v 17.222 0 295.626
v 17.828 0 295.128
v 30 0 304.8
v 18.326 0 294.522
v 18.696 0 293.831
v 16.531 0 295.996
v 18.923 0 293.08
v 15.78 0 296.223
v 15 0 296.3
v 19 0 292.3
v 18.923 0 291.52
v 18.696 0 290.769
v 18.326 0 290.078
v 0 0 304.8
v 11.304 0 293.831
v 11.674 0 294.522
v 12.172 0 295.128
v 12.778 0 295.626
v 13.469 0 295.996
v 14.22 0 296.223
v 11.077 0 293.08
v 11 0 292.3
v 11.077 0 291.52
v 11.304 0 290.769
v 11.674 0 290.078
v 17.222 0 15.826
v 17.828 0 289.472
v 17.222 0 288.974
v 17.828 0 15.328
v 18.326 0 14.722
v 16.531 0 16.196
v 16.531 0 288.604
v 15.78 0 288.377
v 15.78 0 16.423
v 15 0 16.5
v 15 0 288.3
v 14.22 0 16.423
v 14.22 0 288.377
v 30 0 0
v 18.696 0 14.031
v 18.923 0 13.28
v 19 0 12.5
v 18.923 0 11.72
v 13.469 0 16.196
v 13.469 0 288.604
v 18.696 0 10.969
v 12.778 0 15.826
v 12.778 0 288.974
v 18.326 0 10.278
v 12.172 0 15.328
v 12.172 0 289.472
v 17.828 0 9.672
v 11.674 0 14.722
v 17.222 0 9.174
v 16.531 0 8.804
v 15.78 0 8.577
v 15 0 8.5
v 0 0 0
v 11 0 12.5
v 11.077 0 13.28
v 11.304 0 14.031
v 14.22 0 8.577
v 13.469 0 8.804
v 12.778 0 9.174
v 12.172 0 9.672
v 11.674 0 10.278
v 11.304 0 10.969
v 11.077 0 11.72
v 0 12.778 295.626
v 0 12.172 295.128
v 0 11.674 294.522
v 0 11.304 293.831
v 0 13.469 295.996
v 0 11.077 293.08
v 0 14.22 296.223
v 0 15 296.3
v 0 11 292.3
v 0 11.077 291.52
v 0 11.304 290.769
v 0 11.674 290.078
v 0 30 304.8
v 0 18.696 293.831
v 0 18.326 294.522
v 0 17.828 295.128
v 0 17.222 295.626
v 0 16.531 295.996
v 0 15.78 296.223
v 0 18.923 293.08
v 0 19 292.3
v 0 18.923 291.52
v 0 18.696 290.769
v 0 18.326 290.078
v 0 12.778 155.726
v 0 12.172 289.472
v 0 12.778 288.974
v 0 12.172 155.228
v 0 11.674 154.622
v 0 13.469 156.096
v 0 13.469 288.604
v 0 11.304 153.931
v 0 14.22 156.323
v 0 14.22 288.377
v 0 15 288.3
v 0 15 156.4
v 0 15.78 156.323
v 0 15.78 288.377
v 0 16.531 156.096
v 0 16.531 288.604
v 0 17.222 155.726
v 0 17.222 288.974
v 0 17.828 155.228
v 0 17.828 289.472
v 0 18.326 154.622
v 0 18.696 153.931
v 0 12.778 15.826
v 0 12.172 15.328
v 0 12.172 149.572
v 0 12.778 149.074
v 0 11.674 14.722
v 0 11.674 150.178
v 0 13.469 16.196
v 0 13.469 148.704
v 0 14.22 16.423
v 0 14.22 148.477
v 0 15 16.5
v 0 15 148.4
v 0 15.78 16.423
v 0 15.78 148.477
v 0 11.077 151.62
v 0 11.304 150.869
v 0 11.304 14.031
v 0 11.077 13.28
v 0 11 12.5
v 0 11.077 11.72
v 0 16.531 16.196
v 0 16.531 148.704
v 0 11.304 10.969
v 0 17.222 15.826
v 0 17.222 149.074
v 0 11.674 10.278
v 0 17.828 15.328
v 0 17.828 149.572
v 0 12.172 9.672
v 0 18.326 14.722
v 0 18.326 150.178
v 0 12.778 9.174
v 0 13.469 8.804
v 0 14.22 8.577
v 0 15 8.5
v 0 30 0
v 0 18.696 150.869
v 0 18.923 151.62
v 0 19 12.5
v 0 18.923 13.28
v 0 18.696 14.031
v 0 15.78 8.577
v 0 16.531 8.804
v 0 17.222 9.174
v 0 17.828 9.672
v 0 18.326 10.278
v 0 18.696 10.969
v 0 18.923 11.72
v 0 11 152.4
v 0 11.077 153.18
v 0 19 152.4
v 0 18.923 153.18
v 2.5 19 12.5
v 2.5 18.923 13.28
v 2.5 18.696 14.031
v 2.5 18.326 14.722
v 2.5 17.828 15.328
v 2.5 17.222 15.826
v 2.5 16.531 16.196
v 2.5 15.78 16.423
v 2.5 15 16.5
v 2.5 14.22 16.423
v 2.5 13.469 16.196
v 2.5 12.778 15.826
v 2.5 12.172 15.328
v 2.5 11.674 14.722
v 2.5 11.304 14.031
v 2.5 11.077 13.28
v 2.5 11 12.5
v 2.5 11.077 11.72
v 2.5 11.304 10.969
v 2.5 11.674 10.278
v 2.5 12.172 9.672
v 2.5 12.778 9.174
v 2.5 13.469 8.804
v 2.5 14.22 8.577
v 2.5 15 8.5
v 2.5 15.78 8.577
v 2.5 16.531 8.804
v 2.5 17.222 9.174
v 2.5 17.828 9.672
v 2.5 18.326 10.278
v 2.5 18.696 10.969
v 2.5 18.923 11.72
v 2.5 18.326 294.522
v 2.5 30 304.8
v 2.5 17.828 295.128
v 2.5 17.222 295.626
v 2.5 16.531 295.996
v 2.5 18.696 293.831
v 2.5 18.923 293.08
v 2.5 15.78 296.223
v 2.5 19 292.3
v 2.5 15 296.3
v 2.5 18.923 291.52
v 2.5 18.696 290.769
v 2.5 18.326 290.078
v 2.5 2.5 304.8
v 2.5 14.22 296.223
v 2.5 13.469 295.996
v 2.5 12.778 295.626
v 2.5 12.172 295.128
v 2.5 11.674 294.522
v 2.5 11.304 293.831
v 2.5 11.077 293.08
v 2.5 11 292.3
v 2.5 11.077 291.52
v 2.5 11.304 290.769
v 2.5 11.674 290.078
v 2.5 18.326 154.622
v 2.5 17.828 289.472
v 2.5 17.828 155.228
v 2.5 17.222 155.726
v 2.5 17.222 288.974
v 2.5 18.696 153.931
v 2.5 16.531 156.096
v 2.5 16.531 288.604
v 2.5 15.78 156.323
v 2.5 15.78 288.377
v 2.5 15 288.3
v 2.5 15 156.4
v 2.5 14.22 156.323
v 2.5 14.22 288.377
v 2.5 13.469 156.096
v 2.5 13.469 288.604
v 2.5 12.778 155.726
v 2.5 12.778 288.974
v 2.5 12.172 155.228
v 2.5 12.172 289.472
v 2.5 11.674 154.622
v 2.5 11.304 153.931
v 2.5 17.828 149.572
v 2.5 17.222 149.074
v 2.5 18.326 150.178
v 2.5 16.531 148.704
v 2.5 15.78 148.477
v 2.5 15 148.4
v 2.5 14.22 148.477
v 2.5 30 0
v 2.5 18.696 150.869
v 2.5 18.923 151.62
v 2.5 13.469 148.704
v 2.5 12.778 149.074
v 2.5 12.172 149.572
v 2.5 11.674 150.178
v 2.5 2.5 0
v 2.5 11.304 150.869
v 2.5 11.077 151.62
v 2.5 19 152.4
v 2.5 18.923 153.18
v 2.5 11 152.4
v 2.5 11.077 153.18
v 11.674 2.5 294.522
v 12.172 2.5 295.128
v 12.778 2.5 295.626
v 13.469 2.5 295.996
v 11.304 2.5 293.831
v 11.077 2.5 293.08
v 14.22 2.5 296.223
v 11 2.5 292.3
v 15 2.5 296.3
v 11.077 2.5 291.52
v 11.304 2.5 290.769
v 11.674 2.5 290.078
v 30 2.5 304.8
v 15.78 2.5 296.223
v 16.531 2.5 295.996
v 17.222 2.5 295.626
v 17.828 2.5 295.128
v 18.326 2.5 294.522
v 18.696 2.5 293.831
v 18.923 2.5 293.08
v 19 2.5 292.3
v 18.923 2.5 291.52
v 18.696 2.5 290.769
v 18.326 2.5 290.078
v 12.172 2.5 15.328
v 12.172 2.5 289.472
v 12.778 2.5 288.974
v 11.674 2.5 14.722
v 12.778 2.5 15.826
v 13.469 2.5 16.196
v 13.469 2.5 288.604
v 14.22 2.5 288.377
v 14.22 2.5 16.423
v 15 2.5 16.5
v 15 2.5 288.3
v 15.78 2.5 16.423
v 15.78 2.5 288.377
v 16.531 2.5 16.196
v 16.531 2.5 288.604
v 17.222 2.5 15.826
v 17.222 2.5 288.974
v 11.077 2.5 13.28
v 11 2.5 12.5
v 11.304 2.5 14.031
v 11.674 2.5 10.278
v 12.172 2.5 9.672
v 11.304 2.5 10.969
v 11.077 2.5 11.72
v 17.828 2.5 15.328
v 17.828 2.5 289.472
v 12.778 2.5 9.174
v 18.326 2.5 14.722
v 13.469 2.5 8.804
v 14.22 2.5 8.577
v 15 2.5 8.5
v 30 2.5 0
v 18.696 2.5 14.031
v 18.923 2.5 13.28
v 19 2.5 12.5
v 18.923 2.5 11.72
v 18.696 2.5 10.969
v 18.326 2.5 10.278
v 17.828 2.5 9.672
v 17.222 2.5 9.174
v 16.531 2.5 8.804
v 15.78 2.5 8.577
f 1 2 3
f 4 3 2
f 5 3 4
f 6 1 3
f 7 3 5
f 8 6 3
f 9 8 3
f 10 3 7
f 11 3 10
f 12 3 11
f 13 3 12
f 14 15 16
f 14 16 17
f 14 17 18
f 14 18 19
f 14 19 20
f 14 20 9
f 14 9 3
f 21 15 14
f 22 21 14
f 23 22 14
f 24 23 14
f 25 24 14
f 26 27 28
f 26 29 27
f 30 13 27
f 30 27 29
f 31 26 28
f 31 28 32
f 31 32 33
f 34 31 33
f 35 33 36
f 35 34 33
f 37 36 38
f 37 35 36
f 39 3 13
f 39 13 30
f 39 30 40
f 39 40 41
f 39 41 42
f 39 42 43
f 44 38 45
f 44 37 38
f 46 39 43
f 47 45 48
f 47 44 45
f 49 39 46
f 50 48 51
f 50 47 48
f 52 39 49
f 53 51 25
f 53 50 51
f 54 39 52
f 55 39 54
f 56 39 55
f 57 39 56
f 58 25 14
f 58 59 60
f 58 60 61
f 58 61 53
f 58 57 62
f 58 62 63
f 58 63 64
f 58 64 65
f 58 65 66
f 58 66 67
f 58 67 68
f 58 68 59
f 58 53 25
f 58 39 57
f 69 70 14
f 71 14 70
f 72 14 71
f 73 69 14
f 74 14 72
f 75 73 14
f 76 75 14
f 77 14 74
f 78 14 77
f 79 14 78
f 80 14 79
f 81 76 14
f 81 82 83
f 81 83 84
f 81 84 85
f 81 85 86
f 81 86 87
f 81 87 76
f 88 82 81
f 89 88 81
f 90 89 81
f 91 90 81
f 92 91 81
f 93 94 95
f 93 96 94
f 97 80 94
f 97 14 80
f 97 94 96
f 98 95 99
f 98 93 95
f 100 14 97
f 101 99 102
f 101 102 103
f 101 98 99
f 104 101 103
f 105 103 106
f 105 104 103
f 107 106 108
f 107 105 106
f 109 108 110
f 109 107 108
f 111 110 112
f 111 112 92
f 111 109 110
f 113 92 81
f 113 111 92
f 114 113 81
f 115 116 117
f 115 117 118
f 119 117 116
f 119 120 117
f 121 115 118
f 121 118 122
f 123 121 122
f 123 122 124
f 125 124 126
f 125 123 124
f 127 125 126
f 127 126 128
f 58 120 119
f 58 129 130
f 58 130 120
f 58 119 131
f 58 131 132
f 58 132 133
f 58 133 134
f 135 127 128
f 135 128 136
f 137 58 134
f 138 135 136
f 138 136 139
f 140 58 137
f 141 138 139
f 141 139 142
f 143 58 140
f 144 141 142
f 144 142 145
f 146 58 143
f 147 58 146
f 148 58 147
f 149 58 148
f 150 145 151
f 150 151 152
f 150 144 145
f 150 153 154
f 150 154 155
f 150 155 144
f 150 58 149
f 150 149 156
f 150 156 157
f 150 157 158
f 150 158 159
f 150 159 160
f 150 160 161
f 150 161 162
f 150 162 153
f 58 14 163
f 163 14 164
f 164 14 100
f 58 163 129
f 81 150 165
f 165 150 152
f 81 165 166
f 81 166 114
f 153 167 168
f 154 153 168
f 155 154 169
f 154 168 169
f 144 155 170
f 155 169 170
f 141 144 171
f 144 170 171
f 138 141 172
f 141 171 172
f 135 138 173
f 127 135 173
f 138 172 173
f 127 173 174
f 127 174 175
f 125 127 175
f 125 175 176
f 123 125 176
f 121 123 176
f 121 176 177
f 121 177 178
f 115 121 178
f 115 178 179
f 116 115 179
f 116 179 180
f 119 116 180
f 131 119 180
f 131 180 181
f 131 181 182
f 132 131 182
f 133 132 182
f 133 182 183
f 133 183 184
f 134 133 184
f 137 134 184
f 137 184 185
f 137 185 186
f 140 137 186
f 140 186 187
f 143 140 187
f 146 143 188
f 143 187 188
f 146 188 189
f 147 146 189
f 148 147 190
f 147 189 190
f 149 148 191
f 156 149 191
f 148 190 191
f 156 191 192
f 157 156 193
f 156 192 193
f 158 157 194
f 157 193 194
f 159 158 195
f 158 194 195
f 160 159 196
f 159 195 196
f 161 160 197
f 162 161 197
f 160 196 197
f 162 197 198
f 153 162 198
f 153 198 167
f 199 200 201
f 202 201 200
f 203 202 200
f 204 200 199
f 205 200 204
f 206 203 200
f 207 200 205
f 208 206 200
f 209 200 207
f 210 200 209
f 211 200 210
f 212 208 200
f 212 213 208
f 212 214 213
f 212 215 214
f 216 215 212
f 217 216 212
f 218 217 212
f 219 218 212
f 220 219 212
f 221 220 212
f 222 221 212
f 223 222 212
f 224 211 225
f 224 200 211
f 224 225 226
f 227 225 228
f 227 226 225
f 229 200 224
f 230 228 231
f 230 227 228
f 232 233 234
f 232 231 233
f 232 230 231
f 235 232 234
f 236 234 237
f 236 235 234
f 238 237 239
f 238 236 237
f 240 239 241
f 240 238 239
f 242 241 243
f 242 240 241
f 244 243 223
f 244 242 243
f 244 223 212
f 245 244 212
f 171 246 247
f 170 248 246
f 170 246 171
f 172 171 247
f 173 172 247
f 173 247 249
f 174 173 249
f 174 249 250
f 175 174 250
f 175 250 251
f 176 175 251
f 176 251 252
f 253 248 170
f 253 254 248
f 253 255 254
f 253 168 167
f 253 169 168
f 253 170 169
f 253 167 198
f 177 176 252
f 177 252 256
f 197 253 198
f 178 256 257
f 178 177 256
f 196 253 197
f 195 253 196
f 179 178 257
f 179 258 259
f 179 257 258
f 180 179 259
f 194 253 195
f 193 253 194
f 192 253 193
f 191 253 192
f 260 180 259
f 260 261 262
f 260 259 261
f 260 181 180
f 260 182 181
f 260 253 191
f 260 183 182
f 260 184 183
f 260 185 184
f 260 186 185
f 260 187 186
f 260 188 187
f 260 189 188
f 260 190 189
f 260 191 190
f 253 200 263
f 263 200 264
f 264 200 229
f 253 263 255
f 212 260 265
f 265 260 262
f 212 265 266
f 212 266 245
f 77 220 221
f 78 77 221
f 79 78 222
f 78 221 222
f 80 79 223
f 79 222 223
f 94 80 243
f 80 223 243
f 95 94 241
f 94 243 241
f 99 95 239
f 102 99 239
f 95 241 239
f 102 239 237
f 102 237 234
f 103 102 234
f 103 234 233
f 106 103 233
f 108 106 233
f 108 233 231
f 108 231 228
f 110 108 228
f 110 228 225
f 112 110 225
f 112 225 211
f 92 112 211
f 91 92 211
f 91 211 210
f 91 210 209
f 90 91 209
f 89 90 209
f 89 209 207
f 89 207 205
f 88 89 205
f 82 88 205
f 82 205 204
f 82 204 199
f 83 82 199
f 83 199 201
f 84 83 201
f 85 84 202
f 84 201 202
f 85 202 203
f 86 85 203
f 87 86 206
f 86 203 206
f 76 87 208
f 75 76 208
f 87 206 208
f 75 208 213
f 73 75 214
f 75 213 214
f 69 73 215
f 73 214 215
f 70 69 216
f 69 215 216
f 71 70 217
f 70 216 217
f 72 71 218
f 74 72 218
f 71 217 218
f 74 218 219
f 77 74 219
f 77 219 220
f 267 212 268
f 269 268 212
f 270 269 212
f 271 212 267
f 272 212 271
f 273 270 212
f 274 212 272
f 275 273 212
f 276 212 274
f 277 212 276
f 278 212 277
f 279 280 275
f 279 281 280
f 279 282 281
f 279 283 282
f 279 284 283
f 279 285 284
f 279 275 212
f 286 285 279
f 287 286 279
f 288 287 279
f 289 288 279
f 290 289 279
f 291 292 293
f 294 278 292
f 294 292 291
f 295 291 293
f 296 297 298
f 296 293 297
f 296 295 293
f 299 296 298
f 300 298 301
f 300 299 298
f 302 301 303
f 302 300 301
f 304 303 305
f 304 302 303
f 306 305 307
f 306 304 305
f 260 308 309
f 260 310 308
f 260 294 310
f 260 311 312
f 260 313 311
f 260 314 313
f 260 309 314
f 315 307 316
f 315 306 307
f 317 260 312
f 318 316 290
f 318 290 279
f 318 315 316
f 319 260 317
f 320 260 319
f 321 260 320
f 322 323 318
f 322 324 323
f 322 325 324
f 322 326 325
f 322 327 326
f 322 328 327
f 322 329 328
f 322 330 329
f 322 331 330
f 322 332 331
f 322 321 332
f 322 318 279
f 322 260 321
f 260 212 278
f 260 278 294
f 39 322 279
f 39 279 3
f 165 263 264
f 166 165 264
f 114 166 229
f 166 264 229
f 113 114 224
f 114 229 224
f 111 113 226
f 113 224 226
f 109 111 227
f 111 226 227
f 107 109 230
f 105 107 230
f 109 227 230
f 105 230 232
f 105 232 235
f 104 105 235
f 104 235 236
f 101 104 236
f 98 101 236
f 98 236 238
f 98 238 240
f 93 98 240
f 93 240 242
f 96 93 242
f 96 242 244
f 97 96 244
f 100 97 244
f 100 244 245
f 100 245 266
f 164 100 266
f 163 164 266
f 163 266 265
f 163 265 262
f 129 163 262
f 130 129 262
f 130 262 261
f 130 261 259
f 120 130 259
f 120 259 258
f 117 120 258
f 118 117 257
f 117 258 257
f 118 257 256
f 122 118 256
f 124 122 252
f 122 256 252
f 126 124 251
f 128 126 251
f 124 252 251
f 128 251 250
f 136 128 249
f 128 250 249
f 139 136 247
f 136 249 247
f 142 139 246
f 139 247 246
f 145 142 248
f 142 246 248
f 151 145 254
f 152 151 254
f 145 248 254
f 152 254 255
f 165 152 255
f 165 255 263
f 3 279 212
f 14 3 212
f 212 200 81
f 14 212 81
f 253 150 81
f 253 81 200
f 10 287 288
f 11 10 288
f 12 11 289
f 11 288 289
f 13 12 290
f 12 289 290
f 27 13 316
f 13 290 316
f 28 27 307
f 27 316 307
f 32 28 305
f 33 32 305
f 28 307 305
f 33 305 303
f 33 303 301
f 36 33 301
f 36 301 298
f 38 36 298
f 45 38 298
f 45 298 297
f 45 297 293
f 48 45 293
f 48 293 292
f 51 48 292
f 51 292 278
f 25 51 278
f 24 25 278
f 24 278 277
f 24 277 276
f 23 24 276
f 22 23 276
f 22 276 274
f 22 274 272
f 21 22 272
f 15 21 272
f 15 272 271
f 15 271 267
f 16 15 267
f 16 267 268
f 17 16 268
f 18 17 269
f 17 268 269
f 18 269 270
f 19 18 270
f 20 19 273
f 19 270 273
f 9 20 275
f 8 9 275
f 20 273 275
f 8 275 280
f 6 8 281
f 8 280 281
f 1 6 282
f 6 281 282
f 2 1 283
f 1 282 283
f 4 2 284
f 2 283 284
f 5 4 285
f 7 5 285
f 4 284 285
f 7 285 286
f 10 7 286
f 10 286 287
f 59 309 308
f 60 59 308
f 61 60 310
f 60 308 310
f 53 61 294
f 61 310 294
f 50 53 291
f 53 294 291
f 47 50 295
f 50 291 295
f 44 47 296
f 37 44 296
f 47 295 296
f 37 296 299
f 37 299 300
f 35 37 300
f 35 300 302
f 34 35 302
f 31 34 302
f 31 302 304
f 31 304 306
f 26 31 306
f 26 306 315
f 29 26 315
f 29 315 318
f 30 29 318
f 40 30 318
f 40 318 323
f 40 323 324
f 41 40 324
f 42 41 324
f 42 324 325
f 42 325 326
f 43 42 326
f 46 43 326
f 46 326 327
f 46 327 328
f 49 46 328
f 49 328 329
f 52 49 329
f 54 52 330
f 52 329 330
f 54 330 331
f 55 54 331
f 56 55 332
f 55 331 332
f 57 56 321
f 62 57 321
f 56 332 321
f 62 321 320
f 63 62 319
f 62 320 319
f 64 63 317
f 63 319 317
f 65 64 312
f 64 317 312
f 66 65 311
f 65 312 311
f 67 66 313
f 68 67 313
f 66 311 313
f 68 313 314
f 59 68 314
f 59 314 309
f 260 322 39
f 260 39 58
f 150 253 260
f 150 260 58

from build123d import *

# Parameters (mm, degrees)
BOSS_EXTRUDE1_DEPTH = 304.8
SKETCH2_R           = 4
CUT_EXTRUDE1_DEPTH  = 308.50494305
SKETCH3_R           = 4
CUT_EXTRUDE2_DEPTH  = 308.50494305
SKETCH5_R           = 4
CUT_EXTRUDE3_DEPTH  = 308.50494305


with BuildPart() as part:
    # Sketch1 → Boss-Extrude1 (new body)
    with BuildSketch(Plane.XY):
        Polygon((0, 0), (0, 30), (2.5, 30), (2.5, 2.5), (30, 2.5), (30, 0), align=None)
    extrude(amount=BOSS_EXTRUDE1_DEPTH)

    # Sketch2 → Cut-Extrude1 (cut, through all)
    with BuildSketch(Plane(origin=(0, 2.5, 0), x_dir=(1, 0, 0), z_dir=(0, 1, 0))):
        with Locations(Location((15, -12.5, 0), (0, 0, 180))):
            Circle(SKETCH2_R)
        with Locations((15, -292.3)):
            Circle(SKETCH2_R)
    extrude(amount=-CUT_EXTRUDE1_DEPTH, mode=Mode.SUBTRACT)

    # Sketch3 → Cut-Extrude2 (cut, through all)
    with BuildSketch(Plane(origin=(2.5, 0, 0), x_dir=(0, 0, -1), z_dir=(1, 0, 0))):
        with Locations(Location((-12.5, 15, 0), (0, 0, 90))):
            Circle(SKETCH3_R)
        with Locations(Location((-292.3, 15, 0), (0, 0, 270))):
            Circle(SKETCH3_R)
    extrude(amount=-CUT_EXTRUDE2_DEPTH, mode=Mode.SUBTRACT)

    # Sketch5 → Cut-Extrude3 (cut, through all)
    with BuildSketch(Plane(origin=(2.5, 0, 0), x_dir=(0, 0, -1), z_dir=(1, 0, 0))):
        with Locations(Location((-152.4, 15, 0), (0, 0, 90))):
            Circle(SKETCH5_R)
    extrude(amount=-CUT_EXTRUDE3_DEPTH, mode=Mode.SUBTRACT)


solid = part.part
